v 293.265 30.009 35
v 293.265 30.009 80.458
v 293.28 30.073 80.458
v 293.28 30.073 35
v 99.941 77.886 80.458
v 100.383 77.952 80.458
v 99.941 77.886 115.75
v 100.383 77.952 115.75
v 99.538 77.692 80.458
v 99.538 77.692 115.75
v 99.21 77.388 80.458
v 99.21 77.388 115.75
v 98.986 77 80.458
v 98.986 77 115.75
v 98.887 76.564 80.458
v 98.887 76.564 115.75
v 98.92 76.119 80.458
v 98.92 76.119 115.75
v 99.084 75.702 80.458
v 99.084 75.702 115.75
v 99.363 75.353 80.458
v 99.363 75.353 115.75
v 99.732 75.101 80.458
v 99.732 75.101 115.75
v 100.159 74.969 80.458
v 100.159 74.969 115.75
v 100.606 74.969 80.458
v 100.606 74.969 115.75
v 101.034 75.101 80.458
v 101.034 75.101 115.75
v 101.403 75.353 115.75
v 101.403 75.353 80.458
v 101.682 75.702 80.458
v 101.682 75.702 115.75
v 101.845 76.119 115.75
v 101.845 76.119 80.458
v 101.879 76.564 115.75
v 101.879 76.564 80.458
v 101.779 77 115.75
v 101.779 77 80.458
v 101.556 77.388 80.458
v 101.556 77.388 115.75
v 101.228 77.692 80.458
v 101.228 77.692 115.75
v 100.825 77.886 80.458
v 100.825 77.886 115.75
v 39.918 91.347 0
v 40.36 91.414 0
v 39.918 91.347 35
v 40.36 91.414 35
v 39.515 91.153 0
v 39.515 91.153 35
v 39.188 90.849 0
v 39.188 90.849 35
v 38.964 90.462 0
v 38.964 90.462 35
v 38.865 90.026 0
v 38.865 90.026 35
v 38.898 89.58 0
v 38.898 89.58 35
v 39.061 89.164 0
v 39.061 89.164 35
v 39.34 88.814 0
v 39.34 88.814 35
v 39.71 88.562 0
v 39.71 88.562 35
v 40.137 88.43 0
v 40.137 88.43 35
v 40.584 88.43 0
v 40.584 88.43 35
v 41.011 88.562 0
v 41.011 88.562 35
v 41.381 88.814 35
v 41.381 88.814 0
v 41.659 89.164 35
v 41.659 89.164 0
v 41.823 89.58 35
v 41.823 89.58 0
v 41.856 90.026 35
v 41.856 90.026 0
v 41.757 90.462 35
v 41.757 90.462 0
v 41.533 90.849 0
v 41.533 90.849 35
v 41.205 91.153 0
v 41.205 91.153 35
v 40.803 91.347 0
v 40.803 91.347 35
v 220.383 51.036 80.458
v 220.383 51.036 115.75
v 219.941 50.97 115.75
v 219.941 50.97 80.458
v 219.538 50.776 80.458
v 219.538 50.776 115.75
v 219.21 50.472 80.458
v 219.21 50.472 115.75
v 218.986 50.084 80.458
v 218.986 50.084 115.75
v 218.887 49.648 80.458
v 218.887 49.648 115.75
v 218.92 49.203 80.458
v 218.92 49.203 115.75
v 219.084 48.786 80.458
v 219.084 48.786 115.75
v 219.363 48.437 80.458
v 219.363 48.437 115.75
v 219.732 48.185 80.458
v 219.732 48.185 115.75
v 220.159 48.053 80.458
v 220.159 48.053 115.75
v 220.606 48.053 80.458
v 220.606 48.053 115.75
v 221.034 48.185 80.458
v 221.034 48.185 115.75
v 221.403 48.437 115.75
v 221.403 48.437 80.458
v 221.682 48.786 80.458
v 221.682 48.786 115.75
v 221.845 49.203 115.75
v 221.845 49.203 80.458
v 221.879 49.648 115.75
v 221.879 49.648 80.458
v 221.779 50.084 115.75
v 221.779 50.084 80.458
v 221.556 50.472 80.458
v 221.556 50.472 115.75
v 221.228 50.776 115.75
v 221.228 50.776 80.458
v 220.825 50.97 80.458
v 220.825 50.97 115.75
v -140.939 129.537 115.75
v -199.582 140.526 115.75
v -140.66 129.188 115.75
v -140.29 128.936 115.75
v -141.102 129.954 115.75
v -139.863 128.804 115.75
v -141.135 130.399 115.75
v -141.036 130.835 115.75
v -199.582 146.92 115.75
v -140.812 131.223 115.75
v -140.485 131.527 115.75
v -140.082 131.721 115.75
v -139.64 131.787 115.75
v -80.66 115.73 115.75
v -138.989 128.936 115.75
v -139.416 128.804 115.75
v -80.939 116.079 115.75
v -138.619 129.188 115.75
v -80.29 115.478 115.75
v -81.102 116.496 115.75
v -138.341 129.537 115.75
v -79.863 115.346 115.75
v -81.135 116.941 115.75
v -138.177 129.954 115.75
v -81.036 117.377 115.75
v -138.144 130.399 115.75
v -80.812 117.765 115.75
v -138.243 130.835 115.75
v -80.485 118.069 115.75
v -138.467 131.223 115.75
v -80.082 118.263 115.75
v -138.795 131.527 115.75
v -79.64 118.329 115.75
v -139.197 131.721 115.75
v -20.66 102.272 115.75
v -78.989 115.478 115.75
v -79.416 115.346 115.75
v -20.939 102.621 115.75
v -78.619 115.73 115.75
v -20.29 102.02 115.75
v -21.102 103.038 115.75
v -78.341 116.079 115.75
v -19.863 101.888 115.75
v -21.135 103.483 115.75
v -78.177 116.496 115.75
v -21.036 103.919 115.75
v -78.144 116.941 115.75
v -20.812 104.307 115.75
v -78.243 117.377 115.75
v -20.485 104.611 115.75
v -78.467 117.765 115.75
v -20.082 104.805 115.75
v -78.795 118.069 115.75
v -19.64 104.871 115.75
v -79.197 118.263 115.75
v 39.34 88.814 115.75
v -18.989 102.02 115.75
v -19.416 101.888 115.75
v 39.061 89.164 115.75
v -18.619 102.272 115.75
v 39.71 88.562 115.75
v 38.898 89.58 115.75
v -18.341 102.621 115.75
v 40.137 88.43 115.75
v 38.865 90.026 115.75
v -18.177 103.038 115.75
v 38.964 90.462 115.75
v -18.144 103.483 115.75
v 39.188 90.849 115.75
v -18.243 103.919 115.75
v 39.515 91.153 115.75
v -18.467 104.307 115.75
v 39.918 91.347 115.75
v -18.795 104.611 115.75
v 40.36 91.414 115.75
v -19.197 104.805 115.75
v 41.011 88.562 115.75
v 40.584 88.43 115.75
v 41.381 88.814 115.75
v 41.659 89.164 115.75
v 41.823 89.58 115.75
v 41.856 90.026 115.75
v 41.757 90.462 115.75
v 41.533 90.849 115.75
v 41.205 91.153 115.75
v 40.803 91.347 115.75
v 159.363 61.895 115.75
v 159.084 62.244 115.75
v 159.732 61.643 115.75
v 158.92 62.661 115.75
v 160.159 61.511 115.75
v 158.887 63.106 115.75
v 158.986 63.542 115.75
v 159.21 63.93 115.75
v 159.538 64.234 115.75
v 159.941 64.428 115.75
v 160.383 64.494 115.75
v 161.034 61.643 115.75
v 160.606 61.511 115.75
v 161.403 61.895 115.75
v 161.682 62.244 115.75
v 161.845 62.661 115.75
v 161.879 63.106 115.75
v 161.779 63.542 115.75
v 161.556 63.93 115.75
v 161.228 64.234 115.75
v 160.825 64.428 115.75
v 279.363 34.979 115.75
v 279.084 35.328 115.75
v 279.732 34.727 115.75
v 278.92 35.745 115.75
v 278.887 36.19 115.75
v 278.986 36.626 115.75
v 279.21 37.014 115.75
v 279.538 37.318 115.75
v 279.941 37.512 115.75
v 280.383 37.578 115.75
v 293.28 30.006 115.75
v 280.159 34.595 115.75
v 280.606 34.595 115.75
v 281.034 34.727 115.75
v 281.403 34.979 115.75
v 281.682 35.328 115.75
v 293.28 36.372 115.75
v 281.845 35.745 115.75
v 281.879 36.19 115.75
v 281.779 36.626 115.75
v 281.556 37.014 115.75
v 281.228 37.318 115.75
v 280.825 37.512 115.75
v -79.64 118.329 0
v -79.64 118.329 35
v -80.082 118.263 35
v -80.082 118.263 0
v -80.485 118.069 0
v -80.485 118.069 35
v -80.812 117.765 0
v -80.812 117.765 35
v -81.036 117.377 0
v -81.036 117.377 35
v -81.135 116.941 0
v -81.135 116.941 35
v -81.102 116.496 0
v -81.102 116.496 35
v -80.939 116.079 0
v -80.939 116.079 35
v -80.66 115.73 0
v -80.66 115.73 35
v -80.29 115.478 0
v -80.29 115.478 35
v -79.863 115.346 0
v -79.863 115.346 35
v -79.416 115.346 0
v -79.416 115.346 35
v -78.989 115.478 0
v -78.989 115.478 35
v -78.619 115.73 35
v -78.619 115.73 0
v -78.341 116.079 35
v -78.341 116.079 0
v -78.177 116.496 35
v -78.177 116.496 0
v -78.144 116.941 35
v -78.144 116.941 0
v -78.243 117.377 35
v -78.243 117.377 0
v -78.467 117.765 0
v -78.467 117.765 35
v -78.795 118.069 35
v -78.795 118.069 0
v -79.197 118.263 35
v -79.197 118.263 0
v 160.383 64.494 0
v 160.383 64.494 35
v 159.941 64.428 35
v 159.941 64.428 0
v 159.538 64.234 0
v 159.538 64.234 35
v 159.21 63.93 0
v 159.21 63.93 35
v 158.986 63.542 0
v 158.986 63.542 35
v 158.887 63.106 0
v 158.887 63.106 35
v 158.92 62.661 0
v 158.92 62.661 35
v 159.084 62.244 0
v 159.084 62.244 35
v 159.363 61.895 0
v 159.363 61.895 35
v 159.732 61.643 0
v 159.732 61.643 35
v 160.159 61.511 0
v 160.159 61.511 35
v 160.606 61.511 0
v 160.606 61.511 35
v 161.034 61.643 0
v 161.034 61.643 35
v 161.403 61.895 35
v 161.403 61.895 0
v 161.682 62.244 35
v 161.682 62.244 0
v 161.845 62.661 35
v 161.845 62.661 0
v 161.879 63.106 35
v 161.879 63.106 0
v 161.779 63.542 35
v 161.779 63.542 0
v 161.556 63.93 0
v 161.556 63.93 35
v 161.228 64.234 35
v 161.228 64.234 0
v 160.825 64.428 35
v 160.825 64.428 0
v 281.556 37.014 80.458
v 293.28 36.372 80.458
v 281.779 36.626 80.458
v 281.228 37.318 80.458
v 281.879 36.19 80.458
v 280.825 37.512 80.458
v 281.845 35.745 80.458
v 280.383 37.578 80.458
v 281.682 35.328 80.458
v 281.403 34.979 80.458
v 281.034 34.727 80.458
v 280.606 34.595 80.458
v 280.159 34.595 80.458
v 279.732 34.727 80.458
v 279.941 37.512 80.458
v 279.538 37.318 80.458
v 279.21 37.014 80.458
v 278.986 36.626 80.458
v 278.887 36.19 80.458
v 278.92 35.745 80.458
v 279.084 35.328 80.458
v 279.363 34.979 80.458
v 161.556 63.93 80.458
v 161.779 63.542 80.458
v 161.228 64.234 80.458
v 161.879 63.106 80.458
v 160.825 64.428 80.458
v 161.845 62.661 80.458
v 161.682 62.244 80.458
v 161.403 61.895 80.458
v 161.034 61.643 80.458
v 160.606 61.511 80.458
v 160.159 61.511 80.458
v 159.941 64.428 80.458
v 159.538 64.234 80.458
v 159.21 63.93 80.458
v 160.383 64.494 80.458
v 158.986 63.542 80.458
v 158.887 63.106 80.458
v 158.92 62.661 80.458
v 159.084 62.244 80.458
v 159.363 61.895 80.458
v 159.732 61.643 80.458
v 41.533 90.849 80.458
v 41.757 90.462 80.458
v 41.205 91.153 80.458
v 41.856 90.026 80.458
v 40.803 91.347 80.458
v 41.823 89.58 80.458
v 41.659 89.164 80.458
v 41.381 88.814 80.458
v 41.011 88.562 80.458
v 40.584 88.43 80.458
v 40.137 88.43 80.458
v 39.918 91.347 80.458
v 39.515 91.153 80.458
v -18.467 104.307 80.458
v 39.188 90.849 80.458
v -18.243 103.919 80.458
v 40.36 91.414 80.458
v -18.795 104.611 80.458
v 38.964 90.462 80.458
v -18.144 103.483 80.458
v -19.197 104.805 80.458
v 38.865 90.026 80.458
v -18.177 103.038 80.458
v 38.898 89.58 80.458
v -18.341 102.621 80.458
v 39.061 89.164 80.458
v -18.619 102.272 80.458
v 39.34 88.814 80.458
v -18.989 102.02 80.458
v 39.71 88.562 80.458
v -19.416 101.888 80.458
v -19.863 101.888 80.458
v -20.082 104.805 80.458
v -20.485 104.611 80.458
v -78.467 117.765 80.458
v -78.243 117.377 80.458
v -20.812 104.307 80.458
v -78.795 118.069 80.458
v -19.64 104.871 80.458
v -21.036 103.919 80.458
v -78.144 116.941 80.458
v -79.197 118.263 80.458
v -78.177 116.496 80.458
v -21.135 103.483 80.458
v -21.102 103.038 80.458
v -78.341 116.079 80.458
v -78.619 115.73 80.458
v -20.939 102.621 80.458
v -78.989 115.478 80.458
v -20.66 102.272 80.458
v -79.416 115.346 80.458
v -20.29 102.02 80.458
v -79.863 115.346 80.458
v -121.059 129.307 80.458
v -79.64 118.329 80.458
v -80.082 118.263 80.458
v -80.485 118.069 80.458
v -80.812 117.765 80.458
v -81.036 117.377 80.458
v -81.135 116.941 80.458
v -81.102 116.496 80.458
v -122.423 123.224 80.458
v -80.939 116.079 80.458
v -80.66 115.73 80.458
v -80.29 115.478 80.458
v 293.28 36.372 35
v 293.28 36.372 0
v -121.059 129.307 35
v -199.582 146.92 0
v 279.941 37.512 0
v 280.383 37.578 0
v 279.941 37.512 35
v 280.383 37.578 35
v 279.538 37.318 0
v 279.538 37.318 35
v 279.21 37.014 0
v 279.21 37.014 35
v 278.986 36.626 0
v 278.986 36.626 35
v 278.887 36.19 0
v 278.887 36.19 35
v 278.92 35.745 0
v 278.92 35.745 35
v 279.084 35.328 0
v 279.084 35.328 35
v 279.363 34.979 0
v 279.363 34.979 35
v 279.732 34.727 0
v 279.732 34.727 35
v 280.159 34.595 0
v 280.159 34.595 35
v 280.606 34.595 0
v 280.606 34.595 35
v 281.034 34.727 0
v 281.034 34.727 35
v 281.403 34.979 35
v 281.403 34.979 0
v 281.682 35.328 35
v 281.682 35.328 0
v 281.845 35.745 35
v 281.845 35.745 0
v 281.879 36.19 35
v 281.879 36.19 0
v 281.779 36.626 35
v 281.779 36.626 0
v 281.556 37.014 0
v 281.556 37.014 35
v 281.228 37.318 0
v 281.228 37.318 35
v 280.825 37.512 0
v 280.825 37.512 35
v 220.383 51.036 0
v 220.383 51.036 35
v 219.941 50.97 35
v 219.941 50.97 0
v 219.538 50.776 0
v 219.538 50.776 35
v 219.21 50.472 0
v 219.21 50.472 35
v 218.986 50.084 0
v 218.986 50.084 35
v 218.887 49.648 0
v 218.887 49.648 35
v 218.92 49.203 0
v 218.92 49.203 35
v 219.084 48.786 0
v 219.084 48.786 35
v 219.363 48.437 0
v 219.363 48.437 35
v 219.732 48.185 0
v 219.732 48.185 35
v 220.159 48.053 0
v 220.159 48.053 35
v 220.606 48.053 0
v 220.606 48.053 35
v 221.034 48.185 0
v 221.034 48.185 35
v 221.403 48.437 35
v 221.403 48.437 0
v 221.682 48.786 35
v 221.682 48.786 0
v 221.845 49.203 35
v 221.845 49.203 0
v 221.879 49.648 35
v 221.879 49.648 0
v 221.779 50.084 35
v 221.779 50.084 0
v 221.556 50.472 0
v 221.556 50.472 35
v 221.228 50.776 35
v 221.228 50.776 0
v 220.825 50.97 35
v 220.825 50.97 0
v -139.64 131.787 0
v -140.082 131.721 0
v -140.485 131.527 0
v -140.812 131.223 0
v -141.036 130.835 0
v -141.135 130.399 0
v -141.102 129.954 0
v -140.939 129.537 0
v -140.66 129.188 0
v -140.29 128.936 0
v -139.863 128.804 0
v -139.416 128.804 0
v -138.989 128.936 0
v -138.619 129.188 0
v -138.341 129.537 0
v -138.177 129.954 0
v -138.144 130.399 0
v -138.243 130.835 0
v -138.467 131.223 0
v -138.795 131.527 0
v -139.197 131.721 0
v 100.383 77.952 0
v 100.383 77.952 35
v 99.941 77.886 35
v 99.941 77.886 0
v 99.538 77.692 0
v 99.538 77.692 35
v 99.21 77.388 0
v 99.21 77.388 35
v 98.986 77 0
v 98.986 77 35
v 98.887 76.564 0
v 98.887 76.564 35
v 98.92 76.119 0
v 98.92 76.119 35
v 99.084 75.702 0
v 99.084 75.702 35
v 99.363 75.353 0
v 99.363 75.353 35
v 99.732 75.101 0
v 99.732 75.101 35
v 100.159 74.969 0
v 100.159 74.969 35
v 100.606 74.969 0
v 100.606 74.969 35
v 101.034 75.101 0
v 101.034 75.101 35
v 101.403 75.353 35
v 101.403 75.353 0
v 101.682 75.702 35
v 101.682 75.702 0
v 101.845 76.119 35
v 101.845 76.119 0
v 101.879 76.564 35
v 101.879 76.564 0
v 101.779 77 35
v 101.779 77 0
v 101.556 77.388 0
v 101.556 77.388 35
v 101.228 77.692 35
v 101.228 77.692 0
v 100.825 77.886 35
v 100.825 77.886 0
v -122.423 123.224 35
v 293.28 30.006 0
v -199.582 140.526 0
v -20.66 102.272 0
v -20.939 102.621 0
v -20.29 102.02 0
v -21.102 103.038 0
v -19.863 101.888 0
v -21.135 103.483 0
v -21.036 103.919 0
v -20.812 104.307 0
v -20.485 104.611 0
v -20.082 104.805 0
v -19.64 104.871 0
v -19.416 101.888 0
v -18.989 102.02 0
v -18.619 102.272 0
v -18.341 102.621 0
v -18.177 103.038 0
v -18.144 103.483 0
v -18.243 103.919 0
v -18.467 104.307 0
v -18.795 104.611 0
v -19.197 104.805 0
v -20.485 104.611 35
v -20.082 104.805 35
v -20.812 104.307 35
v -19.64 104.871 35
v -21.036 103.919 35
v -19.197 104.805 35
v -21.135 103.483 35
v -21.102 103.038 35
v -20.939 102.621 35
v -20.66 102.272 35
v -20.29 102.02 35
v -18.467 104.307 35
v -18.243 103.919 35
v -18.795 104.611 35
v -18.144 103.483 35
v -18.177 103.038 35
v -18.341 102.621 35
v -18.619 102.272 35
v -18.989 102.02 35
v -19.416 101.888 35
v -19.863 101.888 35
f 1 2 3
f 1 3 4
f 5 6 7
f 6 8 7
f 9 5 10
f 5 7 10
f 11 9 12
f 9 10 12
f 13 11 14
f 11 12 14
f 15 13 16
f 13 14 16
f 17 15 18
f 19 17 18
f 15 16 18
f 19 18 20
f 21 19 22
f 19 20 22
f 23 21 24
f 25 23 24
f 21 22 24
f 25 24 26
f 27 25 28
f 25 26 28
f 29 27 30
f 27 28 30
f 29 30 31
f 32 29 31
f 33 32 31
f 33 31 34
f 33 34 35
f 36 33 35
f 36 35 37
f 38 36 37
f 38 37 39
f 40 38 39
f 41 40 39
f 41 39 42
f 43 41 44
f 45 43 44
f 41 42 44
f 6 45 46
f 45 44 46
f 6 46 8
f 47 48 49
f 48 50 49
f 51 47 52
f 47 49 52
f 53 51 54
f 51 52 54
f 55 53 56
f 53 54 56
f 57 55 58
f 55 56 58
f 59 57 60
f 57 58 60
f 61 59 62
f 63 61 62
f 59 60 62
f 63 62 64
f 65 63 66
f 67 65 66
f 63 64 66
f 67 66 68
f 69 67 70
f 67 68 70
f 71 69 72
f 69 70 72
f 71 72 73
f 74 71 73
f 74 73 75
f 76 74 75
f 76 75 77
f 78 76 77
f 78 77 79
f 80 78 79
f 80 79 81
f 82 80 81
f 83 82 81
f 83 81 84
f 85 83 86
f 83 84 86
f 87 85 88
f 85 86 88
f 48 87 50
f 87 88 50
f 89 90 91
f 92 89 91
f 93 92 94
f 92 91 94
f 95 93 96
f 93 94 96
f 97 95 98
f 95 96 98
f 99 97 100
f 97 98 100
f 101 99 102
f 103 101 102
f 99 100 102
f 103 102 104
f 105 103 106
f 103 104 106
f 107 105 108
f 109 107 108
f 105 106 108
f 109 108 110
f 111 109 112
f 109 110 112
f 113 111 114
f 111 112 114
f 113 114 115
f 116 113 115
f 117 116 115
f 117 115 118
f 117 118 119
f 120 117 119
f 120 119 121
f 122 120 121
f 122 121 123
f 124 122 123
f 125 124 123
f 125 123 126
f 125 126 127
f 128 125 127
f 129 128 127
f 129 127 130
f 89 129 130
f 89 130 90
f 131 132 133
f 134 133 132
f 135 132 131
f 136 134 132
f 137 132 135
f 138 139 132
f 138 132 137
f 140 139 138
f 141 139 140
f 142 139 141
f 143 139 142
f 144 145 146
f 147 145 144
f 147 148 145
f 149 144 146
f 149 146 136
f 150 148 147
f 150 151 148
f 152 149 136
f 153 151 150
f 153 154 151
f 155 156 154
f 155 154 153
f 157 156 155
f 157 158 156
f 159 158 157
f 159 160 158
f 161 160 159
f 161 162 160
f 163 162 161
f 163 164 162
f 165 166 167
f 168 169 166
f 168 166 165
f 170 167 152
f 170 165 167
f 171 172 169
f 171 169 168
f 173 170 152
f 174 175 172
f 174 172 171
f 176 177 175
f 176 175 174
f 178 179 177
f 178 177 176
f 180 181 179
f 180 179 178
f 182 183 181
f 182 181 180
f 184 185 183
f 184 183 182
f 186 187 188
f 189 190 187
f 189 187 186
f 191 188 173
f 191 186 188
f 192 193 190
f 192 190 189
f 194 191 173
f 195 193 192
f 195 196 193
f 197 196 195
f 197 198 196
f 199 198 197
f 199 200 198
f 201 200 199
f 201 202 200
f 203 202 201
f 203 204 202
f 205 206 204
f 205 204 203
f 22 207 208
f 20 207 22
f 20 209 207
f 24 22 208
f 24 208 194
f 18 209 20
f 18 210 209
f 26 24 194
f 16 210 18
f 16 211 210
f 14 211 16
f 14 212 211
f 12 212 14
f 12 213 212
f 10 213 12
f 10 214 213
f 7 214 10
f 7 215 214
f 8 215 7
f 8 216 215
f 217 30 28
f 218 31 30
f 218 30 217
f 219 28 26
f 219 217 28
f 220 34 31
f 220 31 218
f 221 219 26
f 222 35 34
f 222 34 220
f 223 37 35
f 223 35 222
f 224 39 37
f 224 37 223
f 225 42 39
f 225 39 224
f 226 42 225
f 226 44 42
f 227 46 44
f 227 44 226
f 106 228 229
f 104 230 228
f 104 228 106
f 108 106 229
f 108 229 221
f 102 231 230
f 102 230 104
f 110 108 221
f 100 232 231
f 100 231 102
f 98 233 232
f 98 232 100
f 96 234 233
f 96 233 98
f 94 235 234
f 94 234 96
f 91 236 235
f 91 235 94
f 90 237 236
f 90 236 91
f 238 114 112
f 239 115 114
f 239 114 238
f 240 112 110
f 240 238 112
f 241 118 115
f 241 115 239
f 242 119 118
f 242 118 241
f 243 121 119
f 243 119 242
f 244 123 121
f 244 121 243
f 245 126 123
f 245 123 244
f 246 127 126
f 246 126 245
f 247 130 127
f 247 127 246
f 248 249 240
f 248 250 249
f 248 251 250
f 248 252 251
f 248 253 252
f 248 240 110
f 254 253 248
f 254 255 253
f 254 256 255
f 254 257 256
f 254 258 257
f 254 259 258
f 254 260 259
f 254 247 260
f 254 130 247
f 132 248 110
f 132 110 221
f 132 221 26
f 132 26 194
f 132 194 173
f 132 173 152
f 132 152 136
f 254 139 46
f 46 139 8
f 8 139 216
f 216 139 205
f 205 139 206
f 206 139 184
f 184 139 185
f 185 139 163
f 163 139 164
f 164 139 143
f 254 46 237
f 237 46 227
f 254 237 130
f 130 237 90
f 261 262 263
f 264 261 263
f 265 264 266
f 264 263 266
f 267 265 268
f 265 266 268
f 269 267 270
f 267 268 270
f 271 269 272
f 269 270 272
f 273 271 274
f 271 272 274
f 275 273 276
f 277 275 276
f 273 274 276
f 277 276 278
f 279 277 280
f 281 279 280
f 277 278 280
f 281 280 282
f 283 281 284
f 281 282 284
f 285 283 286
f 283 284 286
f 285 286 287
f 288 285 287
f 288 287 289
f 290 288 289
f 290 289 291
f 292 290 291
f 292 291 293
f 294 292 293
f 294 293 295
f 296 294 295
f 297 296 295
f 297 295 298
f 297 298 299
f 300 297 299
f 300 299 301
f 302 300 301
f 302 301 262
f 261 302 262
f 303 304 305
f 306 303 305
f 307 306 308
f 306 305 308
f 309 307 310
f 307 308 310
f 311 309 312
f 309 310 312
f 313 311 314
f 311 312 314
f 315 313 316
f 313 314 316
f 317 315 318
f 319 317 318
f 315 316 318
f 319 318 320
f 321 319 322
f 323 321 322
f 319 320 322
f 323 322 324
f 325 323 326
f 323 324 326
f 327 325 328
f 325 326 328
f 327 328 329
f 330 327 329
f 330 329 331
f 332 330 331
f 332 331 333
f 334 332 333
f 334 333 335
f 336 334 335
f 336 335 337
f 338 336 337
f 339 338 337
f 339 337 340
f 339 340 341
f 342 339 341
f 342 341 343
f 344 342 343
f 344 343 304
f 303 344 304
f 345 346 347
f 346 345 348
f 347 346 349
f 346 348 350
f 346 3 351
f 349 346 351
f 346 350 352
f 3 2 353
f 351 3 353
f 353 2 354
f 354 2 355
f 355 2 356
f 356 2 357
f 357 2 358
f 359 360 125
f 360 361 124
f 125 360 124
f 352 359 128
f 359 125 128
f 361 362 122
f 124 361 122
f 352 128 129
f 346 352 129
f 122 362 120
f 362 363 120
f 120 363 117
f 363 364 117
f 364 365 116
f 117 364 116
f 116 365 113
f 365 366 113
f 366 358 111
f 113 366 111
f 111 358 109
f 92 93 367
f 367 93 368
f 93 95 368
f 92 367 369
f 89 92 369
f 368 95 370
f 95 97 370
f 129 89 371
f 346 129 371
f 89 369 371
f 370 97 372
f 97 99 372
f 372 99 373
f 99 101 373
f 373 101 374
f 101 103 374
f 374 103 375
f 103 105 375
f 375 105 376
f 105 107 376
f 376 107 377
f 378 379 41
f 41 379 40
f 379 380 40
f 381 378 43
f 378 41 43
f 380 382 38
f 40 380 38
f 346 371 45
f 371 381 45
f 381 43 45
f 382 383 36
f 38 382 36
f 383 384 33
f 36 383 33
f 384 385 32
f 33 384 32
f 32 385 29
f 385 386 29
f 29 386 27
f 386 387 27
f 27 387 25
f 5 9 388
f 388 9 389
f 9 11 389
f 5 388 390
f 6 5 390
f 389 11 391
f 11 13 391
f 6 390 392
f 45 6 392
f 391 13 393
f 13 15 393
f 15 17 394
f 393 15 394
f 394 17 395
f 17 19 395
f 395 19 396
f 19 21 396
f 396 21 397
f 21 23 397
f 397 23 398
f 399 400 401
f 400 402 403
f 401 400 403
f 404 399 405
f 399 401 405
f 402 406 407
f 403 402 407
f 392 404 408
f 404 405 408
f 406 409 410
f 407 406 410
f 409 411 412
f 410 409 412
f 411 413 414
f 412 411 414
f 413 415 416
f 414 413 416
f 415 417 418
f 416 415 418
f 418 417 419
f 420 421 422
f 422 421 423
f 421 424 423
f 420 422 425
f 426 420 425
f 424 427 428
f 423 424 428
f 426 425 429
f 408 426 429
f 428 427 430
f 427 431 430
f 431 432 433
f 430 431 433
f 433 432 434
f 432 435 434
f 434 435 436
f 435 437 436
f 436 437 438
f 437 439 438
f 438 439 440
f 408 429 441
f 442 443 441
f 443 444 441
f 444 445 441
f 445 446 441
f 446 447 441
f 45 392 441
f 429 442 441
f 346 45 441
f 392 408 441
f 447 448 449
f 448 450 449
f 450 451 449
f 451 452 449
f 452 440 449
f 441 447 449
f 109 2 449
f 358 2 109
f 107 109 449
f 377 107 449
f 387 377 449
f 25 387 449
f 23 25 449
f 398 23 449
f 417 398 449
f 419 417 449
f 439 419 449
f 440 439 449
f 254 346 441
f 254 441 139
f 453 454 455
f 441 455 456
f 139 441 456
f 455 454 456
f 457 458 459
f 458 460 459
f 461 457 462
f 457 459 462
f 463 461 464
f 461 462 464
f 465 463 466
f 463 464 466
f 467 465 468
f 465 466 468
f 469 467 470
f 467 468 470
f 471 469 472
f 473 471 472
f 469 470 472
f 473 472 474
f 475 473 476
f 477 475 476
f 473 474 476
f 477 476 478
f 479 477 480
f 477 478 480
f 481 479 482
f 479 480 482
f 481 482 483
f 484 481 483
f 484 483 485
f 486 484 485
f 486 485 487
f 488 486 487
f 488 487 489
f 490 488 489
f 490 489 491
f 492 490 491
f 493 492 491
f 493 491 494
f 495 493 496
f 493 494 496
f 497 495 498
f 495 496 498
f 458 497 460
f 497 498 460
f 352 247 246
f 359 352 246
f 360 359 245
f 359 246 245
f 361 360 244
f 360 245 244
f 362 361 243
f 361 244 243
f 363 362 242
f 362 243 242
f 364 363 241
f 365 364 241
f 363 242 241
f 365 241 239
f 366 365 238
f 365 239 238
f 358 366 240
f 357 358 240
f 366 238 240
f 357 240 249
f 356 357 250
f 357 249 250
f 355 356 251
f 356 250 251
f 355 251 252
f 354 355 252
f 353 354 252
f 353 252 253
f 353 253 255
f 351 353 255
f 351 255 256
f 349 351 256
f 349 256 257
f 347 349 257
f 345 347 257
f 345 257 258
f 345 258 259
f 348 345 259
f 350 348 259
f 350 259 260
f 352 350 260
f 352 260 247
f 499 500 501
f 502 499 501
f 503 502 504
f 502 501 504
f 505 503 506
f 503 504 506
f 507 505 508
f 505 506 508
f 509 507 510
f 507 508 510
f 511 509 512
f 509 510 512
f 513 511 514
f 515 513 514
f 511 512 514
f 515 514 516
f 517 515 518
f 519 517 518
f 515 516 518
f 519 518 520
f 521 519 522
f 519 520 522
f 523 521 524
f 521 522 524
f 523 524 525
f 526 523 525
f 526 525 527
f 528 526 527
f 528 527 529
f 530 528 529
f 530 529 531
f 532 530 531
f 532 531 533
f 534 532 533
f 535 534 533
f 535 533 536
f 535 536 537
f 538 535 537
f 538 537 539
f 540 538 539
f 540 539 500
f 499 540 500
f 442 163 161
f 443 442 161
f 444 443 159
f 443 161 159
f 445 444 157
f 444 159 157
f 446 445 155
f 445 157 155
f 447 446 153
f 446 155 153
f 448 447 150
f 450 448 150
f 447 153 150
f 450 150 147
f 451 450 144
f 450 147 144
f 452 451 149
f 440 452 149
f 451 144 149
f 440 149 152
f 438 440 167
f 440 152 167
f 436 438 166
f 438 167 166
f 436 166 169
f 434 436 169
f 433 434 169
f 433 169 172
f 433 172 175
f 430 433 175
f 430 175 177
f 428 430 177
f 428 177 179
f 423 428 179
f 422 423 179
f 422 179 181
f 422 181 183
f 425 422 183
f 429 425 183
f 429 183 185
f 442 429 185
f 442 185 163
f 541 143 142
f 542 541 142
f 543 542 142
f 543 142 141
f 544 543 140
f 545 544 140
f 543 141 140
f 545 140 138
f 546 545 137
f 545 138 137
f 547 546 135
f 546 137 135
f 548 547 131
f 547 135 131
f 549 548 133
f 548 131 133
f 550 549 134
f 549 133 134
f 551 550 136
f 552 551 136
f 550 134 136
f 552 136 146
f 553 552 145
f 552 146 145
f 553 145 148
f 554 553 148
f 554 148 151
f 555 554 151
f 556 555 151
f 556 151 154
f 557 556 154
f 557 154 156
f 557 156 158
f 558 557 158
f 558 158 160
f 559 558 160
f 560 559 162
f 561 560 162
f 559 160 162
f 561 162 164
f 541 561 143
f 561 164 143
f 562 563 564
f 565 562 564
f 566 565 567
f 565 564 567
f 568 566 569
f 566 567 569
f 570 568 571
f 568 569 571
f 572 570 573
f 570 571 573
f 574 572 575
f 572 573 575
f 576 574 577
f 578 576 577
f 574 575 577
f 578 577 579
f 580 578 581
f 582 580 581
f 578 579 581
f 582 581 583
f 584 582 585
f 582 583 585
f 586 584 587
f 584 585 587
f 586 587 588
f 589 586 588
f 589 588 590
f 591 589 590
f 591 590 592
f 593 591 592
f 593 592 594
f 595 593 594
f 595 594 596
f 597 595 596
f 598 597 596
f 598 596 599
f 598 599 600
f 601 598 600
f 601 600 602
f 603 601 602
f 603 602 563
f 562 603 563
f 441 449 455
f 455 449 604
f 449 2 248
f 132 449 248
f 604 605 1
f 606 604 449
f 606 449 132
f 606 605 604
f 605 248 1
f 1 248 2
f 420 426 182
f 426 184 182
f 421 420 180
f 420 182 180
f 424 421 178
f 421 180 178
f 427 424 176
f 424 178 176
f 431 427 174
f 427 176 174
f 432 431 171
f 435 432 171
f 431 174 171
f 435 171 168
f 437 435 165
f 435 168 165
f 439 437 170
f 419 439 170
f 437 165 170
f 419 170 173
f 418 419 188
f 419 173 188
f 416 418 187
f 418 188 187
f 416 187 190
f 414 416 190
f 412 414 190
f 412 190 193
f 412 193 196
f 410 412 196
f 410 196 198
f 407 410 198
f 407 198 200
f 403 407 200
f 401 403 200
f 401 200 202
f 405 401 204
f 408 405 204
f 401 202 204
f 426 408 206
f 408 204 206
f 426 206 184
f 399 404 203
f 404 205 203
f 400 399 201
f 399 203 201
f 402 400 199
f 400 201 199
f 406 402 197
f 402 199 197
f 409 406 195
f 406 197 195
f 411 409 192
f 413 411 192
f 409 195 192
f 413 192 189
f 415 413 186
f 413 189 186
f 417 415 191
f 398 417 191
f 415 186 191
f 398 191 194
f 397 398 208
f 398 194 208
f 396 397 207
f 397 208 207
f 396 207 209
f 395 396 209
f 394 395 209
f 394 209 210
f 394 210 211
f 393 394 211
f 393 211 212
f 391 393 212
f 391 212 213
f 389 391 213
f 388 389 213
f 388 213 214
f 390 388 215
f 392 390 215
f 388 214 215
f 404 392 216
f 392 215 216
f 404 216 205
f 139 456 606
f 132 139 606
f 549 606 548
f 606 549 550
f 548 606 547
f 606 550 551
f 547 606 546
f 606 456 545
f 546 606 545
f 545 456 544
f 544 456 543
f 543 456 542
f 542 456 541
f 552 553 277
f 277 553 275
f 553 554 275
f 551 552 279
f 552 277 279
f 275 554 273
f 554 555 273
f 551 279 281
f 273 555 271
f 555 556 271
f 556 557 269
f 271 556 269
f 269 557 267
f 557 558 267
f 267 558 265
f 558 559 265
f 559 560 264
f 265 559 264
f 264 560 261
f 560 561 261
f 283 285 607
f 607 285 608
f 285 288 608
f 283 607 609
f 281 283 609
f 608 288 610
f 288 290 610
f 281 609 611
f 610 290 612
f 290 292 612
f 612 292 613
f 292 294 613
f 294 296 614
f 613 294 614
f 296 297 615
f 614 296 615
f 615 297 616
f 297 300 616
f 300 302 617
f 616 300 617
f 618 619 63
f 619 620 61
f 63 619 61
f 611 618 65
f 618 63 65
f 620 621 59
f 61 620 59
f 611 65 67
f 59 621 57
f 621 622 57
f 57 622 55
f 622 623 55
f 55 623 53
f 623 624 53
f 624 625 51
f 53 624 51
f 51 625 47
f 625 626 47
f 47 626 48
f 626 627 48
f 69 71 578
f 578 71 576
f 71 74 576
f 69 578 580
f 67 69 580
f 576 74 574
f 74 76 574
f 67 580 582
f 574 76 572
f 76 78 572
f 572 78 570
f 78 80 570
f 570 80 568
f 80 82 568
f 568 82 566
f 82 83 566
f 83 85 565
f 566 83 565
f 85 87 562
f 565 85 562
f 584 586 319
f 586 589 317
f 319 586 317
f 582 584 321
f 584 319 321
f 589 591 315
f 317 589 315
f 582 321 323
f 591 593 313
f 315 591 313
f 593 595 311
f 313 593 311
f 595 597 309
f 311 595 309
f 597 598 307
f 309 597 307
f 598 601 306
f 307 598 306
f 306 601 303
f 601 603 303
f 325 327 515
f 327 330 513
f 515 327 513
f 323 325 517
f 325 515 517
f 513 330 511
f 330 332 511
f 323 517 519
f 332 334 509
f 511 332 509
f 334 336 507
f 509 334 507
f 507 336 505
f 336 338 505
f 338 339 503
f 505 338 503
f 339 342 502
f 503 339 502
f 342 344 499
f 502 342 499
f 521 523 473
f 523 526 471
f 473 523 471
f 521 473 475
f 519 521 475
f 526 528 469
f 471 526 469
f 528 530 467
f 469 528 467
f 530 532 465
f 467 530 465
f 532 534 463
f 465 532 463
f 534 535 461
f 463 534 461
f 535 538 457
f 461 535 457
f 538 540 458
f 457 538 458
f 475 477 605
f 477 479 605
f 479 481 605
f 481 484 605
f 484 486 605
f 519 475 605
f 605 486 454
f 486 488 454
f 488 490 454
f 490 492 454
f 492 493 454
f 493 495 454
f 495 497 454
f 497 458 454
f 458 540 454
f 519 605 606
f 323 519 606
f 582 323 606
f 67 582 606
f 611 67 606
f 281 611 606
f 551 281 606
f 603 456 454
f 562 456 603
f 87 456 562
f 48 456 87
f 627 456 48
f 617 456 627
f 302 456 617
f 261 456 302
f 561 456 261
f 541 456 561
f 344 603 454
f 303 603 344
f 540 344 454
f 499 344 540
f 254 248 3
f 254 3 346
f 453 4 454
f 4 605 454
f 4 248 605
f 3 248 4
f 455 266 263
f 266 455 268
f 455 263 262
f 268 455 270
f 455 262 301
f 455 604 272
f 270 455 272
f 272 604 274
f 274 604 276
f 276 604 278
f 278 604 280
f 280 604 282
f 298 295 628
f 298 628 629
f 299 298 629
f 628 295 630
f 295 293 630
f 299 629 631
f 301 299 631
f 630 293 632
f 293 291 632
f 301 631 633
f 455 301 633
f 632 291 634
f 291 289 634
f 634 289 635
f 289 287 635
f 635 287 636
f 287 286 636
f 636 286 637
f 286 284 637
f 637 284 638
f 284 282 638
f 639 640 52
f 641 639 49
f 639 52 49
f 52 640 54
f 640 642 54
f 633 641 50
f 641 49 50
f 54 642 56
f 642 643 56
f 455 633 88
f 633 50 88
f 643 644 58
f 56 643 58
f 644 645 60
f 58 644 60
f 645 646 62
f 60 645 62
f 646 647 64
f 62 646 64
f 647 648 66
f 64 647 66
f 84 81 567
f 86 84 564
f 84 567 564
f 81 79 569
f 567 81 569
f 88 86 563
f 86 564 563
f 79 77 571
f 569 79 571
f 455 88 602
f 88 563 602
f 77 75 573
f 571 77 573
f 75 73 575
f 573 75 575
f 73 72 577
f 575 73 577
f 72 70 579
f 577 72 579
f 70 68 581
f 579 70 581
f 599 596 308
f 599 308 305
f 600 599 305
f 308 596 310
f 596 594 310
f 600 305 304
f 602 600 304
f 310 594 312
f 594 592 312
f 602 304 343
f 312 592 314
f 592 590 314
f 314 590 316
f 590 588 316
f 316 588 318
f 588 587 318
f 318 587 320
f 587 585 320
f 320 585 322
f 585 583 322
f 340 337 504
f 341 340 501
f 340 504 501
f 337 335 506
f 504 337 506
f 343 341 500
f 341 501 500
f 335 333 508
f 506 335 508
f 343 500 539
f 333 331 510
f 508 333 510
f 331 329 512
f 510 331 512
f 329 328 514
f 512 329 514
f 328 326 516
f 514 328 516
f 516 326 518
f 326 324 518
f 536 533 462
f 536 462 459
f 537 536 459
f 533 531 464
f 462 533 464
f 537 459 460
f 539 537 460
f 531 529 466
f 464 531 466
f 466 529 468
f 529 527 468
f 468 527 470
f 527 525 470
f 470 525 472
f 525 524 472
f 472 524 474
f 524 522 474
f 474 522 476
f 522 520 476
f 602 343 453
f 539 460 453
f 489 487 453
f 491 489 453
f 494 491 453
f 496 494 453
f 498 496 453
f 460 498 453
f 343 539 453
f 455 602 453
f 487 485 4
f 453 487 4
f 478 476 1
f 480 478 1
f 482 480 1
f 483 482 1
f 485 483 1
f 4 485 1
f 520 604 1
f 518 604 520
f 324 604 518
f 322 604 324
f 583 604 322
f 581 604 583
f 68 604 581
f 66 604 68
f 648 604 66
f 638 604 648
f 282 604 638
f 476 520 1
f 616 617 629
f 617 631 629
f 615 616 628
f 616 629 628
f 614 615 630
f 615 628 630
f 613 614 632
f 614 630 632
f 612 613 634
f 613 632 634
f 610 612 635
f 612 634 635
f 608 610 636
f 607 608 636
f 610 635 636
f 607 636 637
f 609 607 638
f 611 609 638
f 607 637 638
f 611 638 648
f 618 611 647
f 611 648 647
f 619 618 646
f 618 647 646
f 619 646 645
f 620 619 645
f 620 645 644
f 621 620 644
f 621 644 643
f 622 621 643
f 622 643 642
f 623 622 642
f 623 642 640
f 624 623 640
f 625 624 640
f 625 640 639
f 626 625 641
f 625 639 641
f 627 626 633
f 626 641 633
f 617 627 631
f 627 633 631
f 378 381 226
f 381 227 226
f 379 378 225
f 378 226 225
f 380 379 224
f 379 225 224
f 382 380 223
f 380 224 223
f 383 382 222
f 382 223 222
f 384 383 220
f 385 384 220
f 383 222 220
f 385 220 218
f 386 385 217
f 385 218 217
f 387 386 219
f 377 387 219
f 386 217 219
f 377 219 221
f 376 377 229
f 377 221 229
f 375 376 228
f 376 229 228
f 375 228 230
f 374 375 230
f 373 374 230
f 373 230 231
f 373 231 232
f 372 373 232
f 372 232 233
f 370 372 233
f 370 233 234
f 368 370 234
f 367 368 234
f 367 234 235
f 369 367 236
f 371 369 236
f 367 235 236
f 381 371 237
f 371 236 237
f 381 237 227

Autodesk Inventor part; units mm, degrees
ref_plane "YZ Plane" through (0, 0, 0) normal (1, 0, 0) x (0, 1, 0)
ref_plane "XZ Plane" through (0, 0, 0) normal (0, 1, 0) x (-1, 0, 0)
sketch "Sketch4" plane through (0, 0, 0) normal (0, 0, 1) x (1, 0, 0)
  line L0 (293.2796, 30.0061) -> (-199.5823, 140.5264)
  line L1 (293.2796, 36.3718) -> (-199.5823, 146.9202)
  line L2 (-199.5823, 146.9202) -> (-199.5823, 140.5264)
  line L3 (293.2796, 30.0061) -> (-199.5823, 140.5264)
  line L4 (293.2796, 36.3718) -> (-199.5823, 146.9202)
  line L5 (-199.5823, 146.9202) -> (-199.5823, 140.5264)
  line L6 (293.2796, 30.0061) -> (293.2796, 36.3718)
sketch "Sketch5" plane through (0, 0, 0) normal (0, 0, 1) x (1, 0, 0)
  circle A0 centre (280.3828, 36.0784) radius 3.5
  circle A1 centre (220.3828, 49.5364) radius 3.5
  circle A2 centre (160.3828, 62.9943) radius 3.5
  circle A3 centre (100.3828, 76.4523) radius 3.5
  circle A4 centre (40.3604, 89.9135) radius 3.5
  circle A5 centre (-139.6396, 130.2873) radius 3.5
  circle A6 centre (-79.6396, 116.8294) radius 3.5
  circle A7 centre (-19.6396, 103.3714) radius 3.5
extrude "Extrusion3" add sketch "Sketch4" along normal blind 115.75
ref_plane "Work Plane3" through (111499.6524, -24907.1137, 0) normal (-0.2188346, -0.975762, 0) x (0, 0, -1)
sketch "Sketch6" plane through (111499.6524, -24907.1137, 0) normal (-0.2188346, -0.975762, 0) x (0, 0, -1)
  line L0 (0, -114474.0796) -> (-115.4577, -114474.0796)
  line L1 (-115.4577, -114474.0796) -> (-115.4577, -113968.0685)
  line L2 (-115.4577, -113968.0685) -> (0, -113968.0685)
  line L3 (0, -113968.0685) -> (0, -114474.0796)
  line L4 (0, -113968.0539) -> (-115.75, -113968.0539) projected
  line L5 (-27.7607, -113968.0539) -> (-91.2309, -113968.0539)
  line L6 (-75.4577, -113983.6101) -> (-36.9803, -113983.6101)
  line L7 (-35, -113968.0685) -> (-80.4577, -113968.0685)
  line L8 (-80.4577, -113968.0685) -> (-80.4577, -114394.0796)
  line L9 (-80.4577, -114394.0796) -> (-35, -114394.0796)
  line L10 (-35, -114394.0796) -> (-35, -113968.0685)
  point P0 (0, -114247.6585)
  dimension "d28" = 506.0111
  dimension "d29" = 115.4577
  dimension "d30" = 35
  dimension "d32" = 80
  dimension "d42" = 35
emboss "Emboss1" sketch "Sketch6" operation cut depth 8 direction (-0.2188346, -0.975762, 0) contours L10 L9 L8 L2
hole "Hole1" at (-139.6396, 130.2873, 0) at (-79.6396, 116.8294, 0) at (-19.6396, 103.3714, 0) at (40.3604, 89.9135, 0) at (100.3828, 76.4523, 0) at (160.3828, 62.9943, 0) at (220.3828, 49.5364, 0) at (280.3828, 36.0784, 0) direction (0, 0, 1) diameter 3 end through all
equation "\"d40\" = Thickness"
equation "\"BendRadius\" = Thickness"
equation "\"BendReliefWidth\" = Thickness"
equation "\"BendReliefDepth\" = 0.5 * Thickness"
equation "\"CornerReliefSize\" = 4 * Thickness"
equation "\"MinimumRemnant\" = 2 * Thickness"
equation "\"TransitionRadius\" = BendRadius"
equation "\"JacobiRadiusSize\" = BendRadius"
equation "\"GapSize\" = Thickness"
equation "\"Thickness\" = 0.5"
properties part number "sidesupport"
